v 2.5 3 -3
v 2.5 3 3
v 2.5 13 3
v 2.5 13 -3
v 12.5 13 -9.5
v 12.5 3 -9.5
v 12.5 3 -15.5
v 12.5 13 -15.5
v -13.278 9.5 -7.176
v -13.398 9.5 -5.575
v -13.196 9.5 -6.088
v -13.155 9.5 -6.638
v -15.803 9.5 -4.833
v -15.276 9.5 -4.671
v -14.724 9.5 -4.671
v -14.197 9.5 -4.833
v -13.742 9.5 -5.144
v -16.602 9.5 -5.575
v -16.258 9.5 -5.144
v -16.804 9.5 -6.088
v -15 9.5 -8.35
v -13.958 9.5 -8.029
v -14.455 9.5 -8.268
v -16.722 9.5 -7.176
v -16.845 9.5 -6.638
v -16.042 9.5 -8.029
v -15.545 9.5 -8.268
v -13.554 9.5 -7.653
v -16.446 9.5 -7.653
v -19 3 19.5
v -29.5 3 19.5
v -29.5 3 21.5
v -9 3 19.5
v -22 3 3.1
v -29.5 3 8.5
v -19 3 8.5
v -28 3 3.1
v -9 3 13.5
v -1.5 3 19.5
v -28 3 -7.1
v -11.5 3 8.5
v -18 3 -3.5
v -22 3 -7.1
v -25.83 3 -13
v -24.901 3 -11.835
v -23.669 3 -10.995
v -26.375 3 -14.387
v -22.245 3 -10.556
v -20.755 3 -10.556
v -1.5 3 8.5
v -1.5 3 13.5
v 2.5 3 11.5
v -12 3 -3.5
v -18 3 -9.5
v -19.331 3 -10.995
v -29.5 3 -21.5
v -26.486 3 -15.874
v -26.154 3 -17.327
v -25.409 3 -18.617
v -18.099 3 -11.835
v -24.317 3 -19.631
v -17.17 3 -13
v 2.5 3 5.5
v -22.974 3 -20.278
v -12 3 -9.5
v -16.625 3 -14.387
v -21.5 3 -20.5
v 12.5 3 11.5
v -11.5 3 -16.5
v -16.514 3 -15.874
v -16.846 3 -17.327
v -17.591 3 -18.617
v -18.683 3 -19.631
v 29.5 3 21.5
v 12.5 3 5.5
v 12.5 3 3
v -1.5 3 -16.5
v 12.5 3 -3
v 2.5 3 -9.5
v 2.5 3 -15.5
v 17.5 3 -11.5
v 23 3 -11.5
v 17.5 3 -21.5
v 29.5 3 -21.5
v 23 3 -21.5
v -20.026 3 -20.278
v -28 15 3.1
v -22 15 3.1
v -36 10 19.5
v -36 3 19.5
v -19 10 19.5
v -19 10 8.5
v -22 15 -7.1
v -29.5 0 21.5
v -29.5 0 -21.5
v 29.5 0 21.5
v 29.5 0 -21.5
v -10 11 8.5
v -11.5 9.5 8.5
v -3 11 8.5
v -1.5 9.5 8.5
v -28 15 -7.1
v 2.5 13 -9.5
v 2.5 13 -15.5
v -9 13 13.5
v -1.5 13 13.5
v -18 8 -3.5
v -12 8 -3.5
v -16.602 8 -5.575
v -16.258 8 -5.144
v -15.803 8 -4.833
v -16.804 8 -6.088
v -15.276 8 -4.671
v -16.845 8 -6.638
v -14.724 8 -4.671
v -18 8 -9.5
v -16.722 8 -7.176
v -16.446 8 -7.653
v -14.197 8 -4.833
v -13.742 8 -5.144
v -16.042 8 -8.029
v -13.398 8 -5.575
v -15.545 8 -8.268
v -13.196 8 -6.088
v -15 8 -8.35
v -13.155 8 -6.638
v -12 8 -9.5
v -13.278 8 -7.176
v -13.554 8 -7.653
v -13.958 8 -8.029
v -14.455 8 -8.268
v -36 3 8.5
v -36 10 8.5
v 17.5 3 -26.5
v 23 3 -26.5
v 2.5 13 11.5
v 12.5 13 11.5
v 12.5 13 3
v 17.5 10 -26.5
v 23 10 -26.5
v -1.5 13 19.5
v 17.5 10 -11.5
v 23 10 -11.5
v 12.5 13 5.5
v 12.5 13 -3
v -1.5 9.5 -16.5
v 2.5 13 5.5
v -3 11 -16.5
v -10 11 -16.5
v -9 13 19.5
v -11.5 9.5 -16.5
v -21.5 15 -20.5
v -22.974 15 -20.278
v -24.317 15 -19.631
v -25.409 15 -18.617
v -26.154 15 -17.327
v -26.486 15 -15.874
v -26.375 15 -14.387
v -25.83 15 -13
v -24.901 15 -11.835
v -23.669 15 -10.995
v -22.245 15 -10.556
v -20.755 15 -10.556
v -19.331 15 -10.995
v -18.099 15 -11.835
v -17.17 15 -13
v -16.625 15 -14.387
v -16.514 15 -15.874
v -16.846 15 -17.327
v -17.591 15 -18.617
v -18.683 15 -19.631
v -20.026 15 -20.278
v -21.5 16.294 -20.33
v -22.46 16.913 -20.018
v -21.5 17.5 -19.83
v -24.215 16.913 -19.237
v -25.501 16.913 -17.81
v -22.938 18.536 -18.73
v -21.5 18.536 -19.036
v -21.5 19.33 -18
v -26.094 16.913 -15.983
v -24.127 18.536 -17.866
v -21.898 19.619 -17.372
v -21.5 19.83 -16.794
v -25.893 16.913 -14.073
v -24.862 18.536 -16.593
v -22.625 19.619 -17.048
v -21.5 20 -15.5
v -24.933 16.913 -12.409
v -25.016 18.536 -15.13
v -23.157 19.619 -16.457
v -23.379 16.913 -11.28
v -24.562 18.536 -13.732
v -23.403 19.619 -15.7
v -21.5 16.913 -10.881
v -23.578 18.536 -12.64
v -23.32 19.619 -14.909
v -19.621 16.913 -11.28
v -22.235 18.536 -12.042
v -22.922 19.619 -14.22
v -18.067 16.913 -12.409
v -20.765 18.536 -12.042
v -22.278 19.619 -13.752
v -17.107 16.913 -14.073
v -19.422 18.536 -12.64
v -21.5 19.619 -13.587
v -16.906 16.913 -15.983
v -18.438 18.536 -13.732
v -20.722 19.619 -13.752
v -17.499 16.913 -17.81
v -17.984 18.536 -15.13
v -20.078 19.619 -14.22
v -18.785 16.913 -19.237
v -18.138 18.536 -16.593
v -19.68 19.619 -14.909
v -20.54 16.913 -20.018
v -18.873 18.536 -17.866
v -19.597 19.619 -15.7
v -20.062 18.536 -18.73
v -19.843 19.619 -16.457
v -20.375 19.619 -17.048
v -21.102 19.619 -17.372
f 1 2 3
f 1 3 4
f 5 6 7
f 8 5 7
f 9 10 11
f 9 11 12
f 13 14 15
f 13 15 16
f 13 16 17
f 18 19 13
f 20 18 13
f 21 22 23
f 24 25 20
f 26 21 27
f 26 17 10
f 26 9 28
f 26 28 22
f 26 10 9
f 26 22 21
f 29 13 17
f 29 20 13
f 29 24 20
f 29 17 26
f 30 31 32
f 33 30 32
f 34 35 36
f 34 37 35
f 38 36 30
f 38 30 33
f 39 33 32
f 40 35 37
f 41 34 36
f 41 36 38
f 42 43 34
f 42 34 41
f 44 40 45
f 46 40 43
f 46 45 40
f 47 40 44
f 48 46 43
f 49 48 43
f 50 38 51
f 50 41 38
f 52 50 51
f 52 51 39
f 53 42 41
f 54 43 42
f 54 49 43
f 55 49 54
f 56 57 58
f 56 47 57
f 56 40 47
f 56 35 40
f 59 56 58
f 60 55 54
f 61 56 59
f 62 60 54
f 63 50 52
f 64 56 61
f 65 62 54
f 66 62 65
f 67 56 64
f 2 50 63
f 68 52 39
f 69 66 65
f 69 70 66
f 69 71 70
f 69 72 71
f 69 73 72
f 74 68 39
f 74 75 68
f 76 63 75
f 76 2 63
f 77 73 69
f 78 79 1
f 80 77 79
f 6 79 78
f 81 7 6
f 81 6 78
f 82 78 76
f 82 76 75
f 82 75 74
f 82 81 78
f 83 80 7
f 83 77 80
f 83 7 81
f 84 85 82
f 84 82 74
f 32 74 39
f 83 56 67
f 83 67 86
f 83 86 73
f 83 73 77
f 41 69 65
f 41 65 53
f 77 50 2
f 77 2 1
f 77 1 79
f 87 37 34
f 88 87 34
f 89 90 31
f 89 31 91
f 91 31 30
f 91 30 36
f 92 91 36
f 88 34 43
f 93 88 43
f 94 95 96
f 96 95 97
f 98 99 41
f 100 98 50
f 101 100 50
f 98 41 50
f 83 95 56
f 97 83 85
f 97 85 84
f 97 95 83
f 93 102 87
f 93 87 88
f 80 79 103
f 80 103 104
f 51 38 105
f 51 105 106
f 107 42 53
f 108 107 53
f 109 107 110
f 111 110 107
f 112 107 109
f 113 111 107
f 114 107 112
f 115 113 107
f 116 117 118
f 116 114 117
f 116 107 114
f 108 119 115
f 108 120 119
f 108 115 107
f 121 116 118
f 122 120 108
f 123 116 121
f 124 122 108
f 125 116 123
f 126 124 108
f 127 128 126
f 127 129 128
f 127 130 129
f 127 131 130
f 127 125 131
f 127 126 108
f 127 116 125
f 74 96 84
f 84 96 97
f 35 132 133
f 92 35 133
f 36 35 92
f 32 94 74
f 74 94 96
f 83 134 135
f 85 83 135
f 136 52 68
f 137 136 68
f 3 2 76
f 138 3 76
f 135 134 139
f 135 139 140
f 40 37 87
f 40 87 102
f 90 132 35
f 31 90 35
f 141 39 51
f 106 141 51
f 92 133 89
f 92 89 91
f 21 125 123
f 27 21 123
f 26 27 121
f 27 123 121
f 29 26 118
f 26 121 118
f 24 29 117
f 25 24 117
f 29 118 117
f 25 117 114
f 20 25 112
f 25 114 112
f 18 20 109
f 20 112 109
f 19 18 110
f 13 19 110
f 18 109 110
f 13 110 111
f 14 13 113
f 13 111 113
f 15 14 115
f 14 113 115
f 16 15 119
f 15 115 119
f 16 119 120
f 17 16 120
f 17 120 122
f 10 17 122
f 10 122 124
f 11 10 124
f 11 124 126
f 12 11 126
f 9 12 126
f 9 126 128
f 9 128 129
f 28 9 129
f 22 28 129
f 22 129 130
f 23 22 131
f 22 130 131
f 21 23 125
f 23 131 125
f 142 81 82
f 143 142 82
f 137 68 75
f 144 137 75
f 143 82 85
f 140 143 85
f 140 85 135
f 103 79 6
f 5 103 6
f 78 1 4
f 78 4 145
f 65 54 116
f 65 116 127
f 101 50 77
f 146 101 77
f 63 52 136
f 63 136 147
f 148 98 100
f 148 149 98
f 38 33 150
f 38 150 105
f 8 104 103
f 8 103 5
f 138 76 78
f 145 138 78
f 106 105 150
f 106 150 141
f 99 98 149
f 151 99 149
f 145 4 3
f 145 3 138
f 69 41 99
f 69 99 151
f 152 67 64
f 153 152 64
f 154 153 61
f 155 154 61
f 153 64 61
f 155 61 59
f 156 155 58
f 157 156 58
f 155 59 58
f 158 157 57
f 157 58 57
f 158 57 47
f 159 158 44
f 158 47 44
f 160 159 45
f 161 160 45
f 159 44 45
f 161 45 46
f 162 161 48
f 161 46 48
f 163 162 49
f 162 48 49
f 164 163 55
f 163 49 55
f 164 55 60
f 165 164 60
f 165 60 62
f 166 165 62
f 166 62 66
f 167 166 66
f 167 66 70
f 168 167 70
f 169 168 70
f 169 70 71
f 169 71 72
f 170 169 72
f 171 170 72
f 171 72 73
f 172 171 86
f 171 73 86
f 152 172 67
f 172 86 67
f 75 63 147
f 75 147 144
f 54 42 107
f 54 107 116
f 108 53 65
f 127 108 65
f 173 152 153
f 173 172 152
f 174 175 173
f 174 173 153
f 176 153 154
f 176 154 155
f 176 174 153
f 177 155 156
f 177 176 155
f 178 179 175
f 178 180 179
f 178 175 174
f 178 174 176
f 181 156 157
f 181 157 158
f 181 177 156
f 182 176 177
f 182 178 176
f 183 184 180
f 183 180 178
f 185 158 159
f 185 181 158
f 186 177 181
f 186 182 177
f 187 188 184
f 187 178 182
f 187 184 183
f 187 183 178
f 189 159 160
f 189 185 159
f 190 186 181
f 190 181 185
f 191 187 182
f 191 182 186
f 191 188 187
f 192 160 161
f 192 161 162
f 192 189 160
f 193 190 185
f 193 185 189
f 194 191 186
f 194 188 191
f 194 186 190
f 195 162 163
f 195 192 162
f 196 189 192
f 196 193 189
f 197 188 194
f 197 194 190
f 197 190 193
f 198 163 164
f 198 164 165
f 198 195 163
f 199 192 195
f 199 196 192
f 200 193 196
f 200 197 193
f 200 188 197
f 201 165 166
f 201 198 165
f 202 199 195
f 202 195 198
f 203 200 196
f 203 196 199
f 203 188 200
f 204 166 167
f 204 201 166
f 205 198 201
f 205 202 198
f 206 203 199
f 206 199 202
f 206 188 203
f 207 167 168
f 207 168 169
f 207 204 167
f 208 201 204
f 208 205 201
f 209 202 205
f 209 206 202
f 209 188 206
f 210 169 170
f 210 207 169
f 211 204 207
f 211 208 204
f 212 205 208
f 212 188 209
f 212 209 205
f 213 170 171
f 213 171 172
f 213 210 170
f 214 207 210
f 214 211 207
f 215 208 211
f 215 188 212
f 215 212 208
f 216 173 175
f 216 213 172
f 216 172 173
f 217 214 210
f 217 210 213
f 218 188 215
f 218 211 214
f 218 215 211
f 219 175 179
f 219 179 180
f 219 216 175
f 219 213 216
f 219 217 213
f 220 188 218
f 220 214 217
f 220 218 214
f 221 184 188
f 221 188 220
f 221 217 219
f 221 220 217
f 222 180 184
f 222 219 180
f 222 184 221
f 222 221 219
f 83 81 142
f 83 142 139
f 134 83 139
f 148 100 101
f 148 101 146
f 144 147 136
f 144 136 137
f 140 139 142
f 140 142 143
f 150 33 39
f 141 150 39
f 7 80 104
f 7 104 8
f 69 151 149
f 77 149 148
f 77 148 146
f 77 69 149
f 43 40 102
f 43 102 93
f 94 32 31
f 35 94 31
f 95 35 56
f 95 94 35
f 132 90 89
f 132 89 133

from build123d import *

# Parameters (mm, degrees)
SKETCH1_W           = 59
SKETCH1_H           = 43
BOSS_EXTRUDE1_DEPTH = 3
SKETCH2_R           = 5
BOSS_EXTRUDE2_DEPTH = 17
SKETCH3_W           = 17
SKETCH3_H           = 11
BOSS_EXTRUDE3_DEPTH = 7
SKETCH4_W           = 5.5
SKETCH4_H           = 15
BOSS_EXTRUDE4_DEPTH = 7
FILLET1_R           = 5
SKETCH5_W           = 7.5
SKETCH5_H           = 6
SKETCH5_W_2         = 10
BOSS_EXTRUDE5_DEPTH = 10
SKETCH6_W           = 6
SKETCH6_H           = 10.2
BOSS_EXTRUDE6_DEPTH = 12
SKETCH7_W           = 10
SKETCH7_H           = 25
BOSS_EXTRUDE7_DEPTH = 8
CHAMFER1_SIZE       = 1.5
SKETCH8_W           = 6
SKETCH8_H           = 6
BOSS_EXTRUDE8_DEPTH = 5
SKETCH9_R           = 1.85
BOSS_EXTRUDE9_DEPTH = 1.5


with BuildPart() as part:
    # Sketch1 → Boss-Extrude1 (new body)
    with BuildSketch(Plane(origin=(0, 0, 0), x_dir=(1, 0, 0), z_dir=(0, 1, 0))):
        Rectangle(SKETCH1_W, SKETCH1_H)
    extrude(amount=BOSS_EXTRUDE1_DEPTH)

    # Sketch2 → Boss-Extrude2 (add)
    with BuildSketch(Plane(origin=(0, 3, 0), x_dir=(1, 0, 0), z_dir=(0, 1, 0))):
        with Locations(Location((-21.5, 15.5, 0), (0, 0, 90))):
            Circle(SKETCH2_R)
    extrude(amount=BOSS_EXTRUDE2_DEPTH)

    # Sketch3 → Boss-Extrude3 (add)
    with BuildSketch(Plane(origin=(0, 3, 0), x_dir=(1, 0, 0), z_dir=(0, 1, 0))):
        with Locations((-27.5, -14)):
            Rectangle(SKETCH3_W, SKETCH3_H)
    extrude(amount=BOSS_EXTRUDE3_DEPTH)

    # Sketch4 → Boss-Extrude4 (add)
    with BuildSketch(Plane(origin=(0, 3, 0), x_dir=(1, 0, 0), z_dir=(0, 1, 0))):
        with Locations((20.25, 19)):
            Rectangle(SKETCH4_W, SKETCH4_H)
    extrude(amount=BOSS_EXTRUDE4_DEPTH)

    # Fillet1
    fillet1_edges = [part.edges().sort_by_distance(p)[0] for p in [
        (-21.5, 20, -10.5),
    ]]
    fillet(fillet1_edges, radius=FILLET1_R)

    # Sketch5 → Boss-Extrude5 (add)
    with BuildSketch(Plane(origin=(0, 3, 0), x_dir=(1, 0, 0), z_dir=(0, 1, 0))):
        with Locations((-5.25, -16.5)):
            Rectangle(SKETCH5_W, SKETCH5_H)
        with Locations((7.5, 12.5)):
            Rectangle(SKETCH5_W_2, SKETCH5_H)
        with Locations((7.5, 0)):
            Rectangle(SKETCH5_W_2, SKETCH5_H)
        with Locations((7.5, -8.5)):
            Rectangle(SKETCH5_W_2, SKETCH5_H)
    extrude(amount=BOSS_EXTRUDE5_DEPTH)

    # Sketch6 → Boss-Extrude6 (add)
    with BuildSketch(Plane(origin=(0, 3, 0), x_dir=(1, 0, 0), z_dir=(0, 1, 0))):
        with Locations((-25, 2)):
            Rectangle(SKETCH6_W, SKETCH6_H)
    extrude(amount=BOSS_EXTRUDE6_DEPTH)

    # Sketch7 → Boss-Extrude7 (add)
    with BuildSketch(Plane(origin=(0, 3, 0), x_dir=(1, 0, 0), z_dir=(0, 1, 0))):
        with Locations((-6.5, 4)):
            Rectangle(SKETCH7_W, SKETCH7_H)
    extrude(amount=BOSS_EXTRUDE7_DEPTH)

    # Chamfer1
    chamfer1_edges = [part.edges().sort_by_distance(p)[0] for p in [
        (-1.5, 11, -4),
        (-11.5, 11, -4),
    ]]
    chamfer(chamfer1_edges, length=CHAMFER1_SIZE)

    # Sketch8 → Boss-Extrude8 (add)
    with BuildSketch(Plane(origin=(0, 3, 0), x_dir=(1, 0, 0), z_dir=(0, 1, 0))):
        with Locations((-15, 6.5)):
            Rectangle(SKETCH8_W, SKETCH8_H)
    extrude(amount=BOSS_EXTRUDE8_DEPTH)

    # Sketch9 → Boss-Extrude9 (add)
    with BuildSketch(Plane(origin=(0, 8, 0), x_dir=(1, 0, 0), z_dir=(0, 1, 0))):
        with Locations(Location((-15, 6.5, 0), (0, 0, 90))):
            Circle(SKETCH9_R)
    extrude(amount=BOSS_EXTRUDE9_DEPTH)


solid = part.part
